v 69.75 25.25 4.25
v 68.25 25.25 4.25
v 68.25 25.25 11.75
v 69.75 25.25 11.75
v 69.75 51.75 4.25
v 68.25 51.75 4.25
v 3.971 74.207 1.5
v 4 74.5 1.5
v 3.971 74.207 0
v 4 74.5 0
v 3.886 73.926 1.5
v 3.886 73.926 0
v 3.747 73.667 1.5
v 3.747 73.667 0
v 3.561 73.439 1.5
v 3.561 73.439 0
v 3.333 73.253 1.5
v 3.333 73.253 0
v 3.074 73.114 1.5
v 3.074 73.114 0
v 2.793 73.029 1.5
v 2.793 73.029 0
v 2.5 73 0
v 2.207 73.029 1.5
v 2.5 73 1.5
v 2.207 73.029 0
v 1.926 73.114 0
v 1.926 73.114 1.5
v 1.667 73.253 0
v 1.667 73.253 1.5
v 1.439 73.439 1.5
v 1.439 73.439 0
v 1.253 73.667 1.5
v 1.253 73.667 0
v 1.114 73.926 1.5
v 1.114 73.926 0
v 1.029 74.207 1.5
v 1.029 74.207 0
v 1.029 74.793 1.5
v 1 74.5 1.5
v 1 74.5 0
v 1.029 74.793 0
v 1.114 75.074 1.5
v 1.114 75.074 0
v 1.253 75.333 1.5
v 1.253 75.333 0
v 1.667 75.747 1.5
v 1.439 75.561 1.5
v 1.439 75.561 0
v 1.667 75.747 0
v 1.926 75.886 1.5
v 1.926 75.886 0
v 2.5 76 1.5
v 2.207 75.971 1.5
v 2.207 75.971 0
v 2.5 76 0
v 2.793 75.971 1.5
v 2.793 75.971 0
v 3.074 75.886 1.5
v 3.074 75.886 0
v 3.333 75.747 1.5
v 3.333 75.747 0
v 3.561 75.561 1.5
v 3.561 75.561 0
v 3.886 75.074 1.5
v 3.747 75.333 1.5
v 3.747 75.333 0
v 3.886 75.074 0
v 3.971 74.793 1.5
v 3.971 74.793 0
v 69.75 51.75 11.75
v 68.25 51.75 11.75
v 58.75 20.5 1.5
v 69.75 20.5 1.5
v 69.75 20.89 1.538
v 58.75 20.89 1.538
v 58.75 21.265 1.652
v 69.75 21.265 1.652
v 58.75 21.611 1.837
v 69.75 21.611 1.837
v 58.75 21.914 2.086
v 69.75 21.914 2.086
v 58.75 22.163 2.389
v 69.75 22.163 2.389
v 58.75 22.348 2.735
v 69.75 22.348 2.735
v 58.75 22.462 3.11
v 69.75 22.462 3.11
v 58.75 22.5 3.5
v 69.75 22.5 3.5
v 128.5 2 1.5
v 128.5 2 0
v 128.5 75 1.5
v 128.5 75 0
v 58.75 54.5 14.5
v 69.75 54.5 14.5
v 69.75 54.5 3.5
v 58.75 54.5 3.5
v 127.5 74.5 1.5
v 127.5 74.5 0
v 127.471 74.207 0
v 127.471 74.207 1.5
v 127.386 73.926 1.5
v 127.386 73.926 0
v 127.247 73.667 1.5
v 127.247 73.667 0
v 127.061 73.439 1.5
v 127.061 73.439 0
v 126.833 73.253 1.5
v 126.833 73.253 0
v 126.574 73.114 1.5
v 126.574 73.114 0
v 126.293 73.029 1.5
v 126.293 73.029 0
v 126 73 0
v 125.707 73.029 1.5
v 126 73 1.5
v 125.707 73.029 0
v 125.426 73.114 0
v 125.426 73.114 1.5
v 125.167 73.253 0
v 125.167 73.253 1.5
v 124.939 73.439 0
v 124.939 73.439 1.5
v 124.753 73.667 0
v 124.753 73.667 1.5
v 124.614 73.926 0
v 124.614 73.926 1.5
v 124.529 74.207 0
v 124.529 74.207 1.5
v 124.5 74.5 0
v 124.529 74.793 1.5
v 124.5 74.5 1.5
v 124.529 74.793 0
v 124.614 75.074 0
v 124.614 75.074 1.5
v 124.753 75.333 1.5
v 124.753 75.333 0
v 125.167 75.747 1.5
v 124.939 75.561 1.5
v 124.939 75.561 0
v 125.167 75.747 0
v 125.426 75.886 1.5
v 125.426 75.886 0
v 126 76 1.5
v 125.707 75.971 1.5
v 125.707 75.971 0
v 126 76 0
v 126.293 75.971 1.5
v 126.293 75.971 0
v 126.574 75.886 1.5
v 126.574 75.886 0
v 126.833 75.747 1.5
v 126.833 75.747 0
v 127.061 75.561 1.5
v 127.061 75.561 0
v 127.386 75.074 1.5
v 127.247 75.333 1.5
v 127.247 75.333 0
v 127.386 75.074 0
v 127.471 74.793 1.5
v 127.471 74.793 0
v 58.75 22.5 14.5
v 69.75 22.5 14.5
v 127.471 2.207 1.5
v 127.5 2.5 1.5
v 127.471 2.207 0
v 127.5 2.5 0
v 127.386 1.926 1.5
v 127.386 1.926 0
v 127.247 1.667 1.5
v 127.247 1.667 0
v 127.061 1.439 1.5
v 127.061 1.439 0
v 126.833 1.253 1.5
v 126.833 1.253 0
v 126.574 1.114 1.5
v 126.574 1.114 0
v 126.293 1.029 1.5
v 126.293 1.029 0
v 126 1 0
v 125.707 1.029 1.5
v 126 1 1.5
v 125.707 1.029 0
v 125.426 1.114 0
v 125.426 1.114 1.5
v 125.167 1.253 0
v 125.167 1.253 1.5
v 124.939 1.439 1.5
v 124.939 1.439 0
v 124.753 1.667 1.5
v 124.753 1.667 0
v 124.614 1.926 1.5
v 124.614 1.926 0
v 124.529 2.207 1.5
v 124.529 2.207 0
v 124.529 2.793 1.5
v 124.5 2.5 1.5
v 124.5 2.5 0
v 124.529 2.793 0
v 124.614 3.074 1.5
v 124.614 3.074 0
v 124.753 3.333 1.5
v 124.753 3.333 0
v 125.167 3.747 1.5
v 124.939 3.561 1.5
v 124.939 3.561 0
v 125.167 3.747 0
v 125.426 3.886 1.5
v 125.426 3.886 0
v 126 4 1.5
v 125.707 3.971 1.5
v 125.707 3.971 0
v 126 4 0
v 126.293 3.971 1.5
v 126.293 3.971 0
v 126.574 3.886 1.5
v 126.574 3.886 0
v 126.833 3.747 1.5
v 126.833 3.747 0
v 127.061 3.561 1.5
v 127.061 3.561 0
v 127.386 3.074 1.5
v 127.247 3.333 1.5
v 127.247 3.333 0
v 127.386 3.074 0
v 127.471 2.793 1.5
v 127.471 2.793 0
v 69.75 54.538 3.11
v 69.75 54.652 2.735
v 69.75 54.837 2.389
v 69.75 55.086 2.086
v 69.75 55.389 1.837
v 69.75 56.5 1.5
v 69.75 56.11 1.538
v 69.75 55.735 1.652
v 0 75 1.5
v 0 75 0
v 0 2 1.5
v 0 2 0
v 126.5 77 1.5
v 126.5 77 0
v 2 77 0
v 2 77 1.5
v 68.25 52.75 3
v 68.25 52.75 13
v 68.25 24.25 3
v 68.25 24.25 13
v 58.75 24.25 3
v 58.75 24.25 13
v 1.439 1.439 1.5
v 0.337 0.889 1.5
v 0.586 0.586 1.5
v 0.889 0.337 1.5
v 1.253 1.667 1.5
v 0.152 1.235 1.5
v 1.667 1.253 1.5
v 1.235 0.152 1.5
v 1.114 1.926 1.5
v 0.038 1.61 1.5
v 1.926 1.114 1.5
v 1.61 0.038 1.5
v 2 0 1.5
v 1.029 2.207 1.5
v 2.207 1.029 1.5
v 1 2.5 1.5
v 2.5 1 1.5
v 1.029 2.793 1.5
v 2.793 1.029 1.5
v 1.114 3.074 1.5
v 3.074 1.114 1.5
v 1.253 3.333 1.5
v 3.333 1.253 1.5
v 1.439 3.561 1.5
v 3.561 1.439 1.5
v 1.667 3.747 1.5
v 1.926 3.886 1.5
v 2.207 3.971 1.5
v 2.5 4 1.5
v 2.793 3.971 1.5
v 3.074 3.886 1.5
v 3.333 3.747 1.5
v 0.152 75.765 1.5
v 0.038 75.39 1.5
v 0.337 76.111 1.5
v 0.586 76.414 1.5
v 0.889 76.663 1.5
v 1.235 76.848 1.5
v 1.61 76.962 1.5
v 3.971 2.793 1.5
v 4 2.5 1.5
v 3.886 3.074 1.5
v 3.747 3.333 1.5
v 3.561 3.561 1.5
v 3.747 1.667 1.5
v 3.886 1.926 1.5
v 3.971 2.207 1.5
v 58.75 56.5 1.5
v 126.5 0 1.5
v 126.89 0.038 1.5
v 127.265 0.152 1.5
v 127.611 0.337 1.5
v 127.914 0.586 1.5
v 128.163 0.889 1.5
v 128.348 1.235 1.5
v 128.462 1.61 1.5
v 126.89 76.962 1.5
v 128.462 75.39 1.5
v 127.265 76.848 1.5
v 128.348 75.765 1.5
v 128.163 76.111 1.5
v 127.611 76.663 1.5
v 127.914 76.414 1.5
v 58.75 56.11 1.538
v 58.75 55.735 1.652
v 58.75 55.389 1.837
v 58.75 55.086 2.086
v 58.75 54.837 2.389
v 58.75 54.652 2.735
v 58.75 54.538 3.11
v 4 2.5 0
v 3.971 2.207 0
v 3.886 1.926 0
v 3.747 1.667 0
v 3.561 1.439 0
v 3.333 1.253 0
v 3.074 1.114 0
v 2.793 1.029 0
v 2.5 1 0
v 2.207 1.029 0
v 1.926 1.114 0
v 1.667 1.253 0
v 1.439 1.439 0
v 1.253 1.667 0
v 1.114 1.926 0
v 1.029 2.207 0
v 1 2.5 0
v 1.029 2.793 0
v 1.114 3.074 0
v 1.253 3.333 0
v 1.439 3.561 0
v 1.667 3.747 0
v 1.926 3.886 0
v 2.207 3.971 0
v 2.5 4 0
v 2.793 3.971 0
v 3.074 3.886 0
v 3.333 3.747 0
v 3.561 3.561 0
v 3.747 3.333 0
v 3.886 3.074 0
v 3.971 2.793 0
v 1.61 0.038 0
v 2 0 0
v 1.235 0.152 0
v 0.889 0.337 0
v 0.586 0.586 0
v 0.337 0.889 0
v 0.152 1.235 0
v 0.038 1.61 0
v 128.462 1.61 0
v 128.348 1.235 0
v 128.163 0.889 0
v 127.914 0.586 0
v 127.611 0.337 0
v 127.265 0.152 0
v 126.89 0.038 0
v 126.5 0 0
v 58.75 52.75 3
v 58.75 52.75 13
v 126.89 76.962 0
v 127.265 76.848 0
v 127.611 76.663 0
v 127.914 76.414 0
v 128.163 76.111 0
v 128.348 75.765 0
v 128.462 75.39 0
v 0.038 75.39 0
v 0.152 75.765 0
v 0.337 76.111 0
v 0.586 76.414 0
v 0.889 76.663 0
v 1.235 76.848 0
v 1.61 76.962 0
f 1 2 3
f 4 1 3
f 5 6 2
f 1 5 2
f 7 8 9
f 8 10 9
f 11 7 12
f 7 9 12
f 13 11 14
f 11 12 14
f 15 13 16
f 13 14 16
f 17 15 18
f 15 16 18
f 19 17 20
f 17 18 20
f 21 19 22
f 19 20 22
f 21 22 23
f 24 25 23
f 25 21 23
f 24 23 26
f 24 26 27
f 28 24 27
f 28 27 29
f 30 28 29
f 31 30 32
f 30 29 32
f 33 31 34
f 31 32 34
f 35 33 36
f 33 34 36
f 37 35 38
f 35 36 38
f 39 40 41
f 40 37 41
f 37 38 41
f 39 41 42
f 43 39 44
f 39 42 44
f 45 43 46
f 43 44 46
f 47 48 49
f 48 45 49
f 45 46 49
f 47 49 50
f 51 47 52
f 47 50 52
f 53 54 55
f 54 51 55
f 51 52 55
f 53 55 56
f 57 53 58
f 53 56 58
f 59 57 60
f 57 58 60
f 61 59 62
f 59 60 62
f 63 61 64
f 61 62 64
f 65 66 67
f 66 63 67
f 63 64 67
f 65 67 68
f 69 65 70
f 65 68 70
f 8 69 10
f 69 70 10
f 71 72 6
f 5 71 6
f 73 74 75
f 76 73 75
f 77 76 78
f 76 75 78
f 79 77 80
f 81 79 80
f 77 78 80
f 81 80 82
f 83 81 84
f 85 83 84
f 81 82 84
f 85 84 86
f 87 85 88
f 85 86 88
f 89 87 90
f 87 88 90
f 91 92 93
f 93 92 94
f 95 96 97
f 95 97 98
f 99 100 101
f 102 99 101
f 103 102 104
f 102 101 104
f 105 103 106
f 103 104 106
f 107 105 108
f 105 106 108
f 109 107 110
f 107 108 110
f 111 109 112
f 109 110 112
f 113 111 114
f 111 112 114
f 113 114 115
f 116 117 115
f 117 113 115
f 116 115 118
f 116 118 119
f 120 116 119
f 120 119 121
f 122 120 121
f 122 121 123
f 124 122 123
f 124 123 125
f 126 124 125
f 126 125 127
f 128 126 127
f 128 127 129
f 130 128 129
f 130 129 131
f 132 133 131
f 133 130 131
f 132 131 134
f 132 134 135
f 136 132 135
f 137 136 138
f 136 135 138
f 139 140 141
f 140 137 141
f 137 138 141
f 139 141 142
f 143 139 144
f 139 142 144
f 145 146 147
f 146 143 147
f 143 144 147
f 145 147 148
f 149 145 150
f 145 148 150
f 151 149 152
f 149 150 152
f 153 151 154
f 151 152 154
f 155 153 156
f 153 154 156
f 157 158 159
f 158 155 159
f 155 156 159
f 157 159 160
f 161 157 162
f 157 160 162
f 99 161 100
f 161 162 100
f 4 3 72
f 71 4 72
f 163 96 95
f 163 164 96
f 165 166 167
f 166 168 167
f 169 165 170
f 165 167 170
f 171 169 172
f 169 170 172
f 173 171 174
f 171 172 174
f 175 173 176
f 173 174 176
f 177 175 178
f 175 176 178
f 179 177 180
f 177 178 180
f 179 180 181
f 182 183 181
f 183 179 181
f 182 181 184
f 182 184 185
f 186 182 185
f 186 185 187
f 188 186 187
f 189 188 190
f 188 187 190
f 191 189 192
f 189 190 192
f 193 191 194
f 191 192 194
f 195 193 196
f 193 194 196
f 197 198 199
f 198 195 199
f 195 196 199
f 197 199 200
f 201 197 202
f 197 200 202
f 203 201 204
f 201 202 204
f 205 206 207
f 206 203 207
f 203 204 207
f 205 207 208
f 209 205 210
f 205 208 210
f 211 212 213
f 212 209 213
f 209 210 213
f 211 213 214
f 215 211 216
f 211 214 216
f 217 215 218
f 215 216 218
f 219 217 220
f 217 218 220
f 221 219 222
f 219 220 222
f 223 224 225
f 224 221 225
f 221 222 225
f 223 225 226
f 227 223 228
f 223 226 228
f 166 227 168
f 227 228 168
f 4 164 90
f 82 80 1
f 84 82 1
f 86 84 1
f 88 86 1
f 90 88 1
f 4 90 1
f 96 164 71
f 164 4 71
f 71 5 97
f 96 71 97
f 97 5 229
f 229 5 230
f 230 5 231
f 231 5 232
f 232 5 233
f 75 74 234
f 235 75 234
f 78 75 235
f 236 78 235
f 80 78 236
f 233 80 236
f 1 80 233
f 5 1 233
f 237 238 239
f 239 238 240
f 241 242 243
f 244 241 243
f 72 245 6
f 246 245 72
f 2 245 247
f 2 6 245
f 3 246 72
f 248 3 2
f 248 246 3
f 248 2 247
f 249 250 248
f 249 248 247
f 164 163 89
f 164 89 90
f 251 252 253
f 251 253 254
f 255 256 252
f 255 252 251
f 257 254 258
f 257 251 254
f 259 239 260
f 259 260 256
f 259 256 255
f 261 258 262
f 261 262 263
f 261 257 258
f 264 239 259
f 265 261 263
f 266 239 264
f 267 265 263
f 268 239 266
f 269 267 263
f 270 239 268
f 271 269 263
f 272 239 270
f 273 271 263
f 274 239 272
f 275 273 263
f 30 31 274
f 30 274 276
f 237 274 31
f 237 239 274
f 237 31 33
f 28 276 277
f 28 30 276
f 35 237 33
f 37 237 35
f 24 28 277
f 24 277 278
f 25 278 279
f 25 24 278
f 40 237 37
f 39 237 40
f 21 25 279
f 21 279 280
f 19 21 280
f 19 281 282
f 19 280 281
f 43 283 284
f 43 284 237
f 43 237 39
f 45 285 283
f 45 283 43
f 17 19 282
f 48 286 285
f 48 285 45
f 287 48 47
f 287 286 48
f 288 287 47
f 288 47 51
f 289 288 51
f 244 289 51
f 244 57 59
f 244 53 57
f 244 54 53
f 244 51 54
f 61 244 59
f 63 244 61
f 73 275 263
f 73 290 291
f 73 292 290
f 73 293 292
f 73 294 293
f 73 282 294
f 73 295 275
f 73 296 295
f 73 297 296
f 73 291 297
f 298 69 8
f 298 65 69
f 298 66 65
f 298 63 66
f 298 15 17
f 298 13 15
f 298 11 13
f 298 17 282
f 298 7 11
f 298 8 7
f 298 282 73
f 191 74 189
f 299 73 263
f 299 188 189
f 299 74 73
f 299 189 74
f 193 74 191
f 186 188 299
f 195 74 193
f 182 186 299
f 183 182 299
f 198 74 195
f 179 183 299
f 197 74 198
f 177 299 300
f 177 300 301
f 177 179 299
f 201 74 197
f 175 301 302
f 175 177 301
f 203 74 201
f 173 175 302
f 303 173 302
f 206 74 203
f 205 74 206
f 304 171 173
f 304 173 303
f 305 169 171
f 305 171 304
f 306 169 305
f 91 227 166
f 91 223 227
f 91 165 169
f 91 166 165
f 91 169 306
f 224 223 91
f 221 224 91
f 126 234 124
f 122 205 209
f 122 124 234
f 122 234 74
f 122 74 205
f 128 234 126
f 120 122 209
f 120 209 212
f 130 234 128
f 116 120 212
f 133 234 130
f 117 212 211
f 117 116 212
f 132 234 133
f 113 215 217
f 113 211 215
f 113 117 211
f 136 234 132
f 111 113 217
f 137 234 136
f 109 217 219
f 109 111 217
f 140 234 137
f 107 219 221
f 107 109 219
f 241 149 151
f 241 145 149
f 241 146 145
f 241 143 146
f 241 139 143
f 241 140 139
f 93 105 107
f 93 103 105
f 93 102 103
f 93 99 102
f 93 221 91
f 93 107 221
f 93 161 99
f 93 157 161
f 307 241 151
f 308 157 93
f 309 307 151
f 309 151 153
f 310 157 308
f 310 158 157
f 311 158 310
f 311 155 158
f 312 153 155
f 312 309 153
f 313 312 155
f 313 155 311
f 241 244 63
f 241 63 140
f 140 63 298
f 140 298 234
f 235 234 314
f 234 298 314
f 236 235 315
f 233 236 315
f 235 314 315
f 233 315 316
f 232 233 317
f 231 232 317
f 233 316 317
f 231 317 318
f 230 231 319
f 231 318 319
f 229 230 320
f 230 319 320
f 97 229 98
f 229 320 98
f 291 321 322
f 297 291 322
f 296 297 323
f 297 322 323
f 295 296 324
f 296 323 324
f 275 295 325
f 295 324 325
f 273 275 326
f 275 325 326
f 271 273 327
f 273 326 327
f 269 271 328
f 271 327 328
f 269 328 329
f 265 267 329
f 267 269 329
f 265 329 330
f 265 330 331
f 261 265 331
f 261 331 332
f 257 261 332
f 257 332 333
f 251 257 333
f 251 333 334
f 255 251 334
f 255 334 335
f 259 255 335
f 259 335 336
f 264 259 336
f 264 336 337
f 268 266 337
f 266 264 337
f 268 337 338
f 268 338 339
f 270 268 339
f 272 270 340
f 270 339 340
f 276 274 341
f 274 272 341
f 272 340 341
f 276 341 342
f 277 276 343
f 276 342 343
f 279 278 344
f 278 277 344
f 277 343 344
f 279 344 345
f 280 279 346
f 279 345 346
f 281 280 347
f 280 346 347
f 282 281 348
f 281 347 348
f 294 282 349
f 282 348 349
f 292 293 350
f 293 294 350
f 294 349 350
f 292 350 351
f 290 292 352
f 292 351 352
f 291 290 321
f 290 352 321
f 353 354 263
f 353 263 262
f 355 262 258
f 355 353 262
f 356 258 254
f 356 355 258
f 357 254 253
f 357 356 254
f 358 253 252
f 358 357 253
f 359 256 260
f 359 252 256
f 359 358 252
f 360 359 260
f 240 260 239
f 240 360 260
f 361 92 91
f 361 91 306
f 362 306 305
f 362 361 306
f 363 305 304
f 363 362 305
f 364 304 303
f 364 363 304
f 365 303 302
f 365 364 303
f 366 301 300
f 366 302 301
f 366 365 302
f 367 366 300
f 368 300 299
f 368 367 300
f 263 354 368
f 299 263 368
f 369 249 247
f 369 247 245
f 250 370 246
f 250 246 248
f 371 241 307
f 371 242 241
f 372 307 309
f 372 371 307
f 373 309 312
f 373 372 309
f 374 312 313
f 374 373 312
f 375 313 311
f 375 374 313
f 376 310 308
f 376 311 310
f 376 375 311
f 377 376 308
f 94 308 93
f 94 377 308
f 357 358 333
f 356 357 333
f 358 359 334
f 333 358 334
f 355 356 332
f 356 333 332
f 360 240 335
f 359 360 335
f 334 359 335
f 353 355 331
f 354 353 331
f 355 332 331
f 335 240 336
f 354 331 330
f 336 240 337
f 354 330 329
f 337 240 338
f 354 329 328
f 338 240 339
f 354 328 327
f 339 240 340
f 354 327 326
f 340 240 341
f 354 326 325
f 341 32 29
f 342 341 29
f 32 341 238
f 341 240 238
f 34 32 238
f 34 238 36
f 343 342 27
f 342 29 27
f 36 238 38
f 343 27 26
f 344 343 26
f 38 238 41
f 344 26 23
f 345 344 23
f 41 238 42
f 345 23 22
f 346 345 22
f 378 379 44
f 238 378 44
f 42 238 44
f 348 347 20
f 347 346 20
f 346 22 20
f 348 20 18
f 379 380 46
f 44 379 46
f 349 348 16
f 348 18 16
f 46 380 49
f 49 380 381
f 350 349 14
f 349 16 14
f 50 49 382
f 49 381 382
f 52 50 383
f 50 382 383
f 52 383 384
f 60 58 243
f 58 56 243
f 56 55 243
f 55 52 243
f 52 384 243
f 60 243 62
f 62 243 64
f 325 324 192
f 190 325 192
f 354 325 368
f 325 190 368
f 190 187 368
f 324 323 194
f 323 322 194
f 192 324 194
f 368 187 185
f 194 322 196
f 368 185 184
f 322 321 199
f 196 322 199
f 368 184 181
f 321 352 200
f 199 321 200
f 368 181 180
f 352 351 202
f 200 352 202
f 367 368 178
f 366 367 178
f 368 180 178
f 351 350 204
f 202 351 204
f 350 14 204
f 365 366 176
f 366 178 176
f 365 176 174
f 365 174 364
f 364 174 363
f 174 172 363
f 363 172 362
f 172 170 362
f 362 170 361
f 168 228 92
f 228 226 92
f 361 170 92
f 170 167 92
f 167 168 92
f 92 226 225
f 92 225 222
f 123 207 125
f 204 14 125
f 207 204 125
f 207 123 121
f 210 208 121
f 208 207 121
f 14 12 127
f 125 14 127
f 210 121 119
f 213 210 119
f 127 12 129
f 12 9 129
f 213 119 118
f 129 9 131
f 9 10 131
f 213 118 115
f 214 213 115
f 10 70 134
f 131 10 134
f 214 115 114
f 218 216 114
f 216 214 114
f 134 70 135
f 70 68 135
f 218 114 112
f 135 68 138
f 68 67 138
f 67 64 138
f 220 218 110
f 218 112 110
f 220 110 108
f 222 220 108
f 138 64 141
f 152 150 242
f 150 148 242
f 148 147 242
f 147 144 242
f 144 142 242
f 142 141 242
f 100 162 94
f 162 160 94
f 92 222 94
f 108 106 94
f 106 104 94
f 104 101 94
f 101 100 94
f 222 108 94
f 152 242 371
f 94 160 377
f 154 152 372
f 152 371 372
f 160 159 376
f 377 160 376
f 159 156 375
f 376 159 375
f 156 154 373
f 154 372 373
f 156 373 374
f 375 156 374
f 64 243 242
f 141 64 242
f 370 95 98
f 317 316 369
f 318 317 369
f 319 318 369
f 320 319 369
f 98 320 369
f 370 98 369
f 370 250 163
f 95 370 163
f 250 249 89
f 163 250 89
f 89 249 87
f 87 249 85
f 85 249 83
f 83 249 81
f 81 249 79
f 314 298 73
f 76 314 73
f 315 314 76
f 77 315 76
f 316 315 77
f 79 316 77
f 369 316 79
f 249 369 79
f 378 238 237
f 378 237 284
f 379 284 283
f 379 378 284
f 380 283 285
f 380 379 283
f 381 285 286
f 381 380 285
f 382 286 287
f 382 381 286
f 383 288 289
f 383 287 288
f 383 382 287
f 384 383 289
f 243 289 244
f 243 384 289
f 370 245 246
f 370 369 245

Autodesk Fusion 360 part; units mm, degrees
sketch "Sketch1" plane through (0, 0, 0) normal (0, 0, 1) x (1, 0, 0)
  line L0 (2, 0) -> (126.5, 0)
  line L1 (128.5, 2) -> (128.5, 75)
  line L2 (126.5, 77) -> (2, 77)
  line L3 (0, 75) -> (0, 2)
  line L4 (0, 74.5) -> (128.5, 74.5) construction
  line L5 (0, 2.5) -> (128.5, 2.5) construction
  line L6 (126, 77) -> (126, 0) construction
  line L7 (2.5, 77) -> (2.5, 0) construction
  circle A0 centre (2.5, 74.5) radius 1.5
  circle A1 centre (126, 74.5) radius 1.5
  circle A2 centre (126, 2.5) radius 1.5
  circle A3 centre (2.5, 2.5) radius 1.5
  arc A4 (2, 77) -> (0, 75) centre (2, 75) ccw
  arc A5 (128.5, 75) -> (126.5, 77) centre (126.5, 75) ccw
  arc A6 (126.5, 0) -> (128.5, 2) centre (126.5, 2) ccw
  arc A7 (0, 2) -> (2, 0) centre (2, 2) ccw
  point P0 (128.5, 0)
  point P1 (0, 77)
  dimension "d1" = 128.5
  dimension "d2" = 77
  dimension "d4" = 3
  dimension "d5" = 3
  dimension "d6" = 3
  dimension "d7" = 3
  dimension "d8" = 2.5
  dimension "d9" = 2.5
  dimension "d10" = 2.5
  dimension "d11" = 2.5
  dimension "d12" = 2
  dimension "d13" = 2
  dimension "d14" = 2
  dimension "d15" = 2
extrude "Extrude1" add sketch "Sketch1" along normal blind 1.5
sketch "Sketch2" plane through (0, 0, 1.5) normal (0, 0, 1) x (-1, 0, 0)
  circle A0 centre (-2.5, -74.5) radius 1.5
  circle A1 centre (-2.5, -2.5) radius 1.5
  circle A2 centre (-126, -2.5) radius 1.5
  circle A3 centre (-126, -74.5) radius 1.5
  arc A4 (0, -2) -> (-2, 0) centre (-2, -2) ccw
  line L0 (-2, 0) -> (-126.5, 0)
  arc A5 (-126.5, 0) -> (-128.5, -2) centre (-126.5, -2) ccw
  line L1 (-128.5, -2) -> (-128.5, -75)
  arc A6 (-128.5, -75) -> (-126.5, -77) centre (-126.5, -75) ccw
  line L2 (-126.5, -77) -> (-2, -77)
  arc A7 (-2, -77) -> (0, -75) centre (-2, -75) ccw
  line L3 (0, -75) -> (0, -2)
  line L4 (0, -38.5) -> (-128.5, -38.5) construction
  line L5 (-64.25, -77) -> (-64.25, 0) construction
  line L6 (-58.75, -22.5) -> (-69.75, -22.5)
  line L7 (-69.75, -22.5) -> (-69.75, -54.5)
  line L8 (-69.75, -54.5) -> (-58.75, -54.5)
  line L9 (-58.75, -54.5) -> (-58.75, -22.5)
  line L10 (-58.75, -22.5) -> (-69.75, -54.5) construction
  line L11 (-69.75, -22.5) -> (-58.75, -54.5) construction
  point P0 (-64.25, -38.5)
  dimension "d18" = 11
  dimension "d19" = 32
extrude "Extrude2" add sketch "Sketch2" along normal blind 13 contours L6 L7 L8 L9
sketch "Sketch3" plane through (58.75, 0, 0) normal (-1, 0, 0) x (0, -1, 0)
  line L0 (-54.5, 1.5) -> (-22.5, 1.5)
  line L1 (-22.5, 1.5) -> (-22.5, 14.5)
  line L2 (-22.5, 14.5) -> (-54.5, 14.5)
  line L3 (-54.5, 14.5) -> (-54.5, 1.5)
  line L4 (-54.5, 8) -> (-22.5, 8) construction
  line L5 (-38.5, 14.5) -> (-38.5, 1.5) construction
  line L6 (-24.25, 3) -> (-52.75, 3)
  line L7 (-52.75, 3) -> (-52.75, 13)
  line L8 (-52.75, 13) -> (-24.25, 13)
  line L9 (-24.25, 13) -> (-24.25, 3)
  line L10 (-24.25, 3) -> (-52.75, 13) construction
  line L11 (-52.75, 3) -> (-24.25, 13) construction
  line L12 (-25.25, 11.75) -> (-51.75, 11.75)
  line L13 (-51.75, 11.75) -> (-51.75, 4.25)
  line L14 (-51.75, 4.25) -> (-25.25, 4.25)
  line L15 (-25.25, 4.25) -> (-25.25, 11.75)
  line L16 (-25.25, 11.75) -> (-51.75, 4.25) construction
  line L17 (-51.75, 11.75) -> (-25.25, 4.25) construction
  point P0 (-38.5, 8)
  point P1 (-38.5, 8)
  dimension "d22" = 28.5
  dimension "d23" = 10
  dimension "d24" = 26.5
  dimension "d25" = 7.5
extrude "Extrude3" cut sketch "Sketch3" against normal blind 30 contours L12 L13 L14 L15
extrude "Extrude4" cut sketch "Sketch3" against normal blind 9.5 contours L6 L7 L8 L9
fillet "Fillet1" radius 2 1 edges at (64.25, 22.5, 1.5)
fillet "Fillet2" radius 2 1 edges at (64.25, 54.5, 1.5)
equation "mounting_hole = 3 mm"
equation "d4 = mounting_hole"
equation "d5 = mounting_hole"
equation "d6 = mounting_hole"
equation "d7 = mounting_hole"
